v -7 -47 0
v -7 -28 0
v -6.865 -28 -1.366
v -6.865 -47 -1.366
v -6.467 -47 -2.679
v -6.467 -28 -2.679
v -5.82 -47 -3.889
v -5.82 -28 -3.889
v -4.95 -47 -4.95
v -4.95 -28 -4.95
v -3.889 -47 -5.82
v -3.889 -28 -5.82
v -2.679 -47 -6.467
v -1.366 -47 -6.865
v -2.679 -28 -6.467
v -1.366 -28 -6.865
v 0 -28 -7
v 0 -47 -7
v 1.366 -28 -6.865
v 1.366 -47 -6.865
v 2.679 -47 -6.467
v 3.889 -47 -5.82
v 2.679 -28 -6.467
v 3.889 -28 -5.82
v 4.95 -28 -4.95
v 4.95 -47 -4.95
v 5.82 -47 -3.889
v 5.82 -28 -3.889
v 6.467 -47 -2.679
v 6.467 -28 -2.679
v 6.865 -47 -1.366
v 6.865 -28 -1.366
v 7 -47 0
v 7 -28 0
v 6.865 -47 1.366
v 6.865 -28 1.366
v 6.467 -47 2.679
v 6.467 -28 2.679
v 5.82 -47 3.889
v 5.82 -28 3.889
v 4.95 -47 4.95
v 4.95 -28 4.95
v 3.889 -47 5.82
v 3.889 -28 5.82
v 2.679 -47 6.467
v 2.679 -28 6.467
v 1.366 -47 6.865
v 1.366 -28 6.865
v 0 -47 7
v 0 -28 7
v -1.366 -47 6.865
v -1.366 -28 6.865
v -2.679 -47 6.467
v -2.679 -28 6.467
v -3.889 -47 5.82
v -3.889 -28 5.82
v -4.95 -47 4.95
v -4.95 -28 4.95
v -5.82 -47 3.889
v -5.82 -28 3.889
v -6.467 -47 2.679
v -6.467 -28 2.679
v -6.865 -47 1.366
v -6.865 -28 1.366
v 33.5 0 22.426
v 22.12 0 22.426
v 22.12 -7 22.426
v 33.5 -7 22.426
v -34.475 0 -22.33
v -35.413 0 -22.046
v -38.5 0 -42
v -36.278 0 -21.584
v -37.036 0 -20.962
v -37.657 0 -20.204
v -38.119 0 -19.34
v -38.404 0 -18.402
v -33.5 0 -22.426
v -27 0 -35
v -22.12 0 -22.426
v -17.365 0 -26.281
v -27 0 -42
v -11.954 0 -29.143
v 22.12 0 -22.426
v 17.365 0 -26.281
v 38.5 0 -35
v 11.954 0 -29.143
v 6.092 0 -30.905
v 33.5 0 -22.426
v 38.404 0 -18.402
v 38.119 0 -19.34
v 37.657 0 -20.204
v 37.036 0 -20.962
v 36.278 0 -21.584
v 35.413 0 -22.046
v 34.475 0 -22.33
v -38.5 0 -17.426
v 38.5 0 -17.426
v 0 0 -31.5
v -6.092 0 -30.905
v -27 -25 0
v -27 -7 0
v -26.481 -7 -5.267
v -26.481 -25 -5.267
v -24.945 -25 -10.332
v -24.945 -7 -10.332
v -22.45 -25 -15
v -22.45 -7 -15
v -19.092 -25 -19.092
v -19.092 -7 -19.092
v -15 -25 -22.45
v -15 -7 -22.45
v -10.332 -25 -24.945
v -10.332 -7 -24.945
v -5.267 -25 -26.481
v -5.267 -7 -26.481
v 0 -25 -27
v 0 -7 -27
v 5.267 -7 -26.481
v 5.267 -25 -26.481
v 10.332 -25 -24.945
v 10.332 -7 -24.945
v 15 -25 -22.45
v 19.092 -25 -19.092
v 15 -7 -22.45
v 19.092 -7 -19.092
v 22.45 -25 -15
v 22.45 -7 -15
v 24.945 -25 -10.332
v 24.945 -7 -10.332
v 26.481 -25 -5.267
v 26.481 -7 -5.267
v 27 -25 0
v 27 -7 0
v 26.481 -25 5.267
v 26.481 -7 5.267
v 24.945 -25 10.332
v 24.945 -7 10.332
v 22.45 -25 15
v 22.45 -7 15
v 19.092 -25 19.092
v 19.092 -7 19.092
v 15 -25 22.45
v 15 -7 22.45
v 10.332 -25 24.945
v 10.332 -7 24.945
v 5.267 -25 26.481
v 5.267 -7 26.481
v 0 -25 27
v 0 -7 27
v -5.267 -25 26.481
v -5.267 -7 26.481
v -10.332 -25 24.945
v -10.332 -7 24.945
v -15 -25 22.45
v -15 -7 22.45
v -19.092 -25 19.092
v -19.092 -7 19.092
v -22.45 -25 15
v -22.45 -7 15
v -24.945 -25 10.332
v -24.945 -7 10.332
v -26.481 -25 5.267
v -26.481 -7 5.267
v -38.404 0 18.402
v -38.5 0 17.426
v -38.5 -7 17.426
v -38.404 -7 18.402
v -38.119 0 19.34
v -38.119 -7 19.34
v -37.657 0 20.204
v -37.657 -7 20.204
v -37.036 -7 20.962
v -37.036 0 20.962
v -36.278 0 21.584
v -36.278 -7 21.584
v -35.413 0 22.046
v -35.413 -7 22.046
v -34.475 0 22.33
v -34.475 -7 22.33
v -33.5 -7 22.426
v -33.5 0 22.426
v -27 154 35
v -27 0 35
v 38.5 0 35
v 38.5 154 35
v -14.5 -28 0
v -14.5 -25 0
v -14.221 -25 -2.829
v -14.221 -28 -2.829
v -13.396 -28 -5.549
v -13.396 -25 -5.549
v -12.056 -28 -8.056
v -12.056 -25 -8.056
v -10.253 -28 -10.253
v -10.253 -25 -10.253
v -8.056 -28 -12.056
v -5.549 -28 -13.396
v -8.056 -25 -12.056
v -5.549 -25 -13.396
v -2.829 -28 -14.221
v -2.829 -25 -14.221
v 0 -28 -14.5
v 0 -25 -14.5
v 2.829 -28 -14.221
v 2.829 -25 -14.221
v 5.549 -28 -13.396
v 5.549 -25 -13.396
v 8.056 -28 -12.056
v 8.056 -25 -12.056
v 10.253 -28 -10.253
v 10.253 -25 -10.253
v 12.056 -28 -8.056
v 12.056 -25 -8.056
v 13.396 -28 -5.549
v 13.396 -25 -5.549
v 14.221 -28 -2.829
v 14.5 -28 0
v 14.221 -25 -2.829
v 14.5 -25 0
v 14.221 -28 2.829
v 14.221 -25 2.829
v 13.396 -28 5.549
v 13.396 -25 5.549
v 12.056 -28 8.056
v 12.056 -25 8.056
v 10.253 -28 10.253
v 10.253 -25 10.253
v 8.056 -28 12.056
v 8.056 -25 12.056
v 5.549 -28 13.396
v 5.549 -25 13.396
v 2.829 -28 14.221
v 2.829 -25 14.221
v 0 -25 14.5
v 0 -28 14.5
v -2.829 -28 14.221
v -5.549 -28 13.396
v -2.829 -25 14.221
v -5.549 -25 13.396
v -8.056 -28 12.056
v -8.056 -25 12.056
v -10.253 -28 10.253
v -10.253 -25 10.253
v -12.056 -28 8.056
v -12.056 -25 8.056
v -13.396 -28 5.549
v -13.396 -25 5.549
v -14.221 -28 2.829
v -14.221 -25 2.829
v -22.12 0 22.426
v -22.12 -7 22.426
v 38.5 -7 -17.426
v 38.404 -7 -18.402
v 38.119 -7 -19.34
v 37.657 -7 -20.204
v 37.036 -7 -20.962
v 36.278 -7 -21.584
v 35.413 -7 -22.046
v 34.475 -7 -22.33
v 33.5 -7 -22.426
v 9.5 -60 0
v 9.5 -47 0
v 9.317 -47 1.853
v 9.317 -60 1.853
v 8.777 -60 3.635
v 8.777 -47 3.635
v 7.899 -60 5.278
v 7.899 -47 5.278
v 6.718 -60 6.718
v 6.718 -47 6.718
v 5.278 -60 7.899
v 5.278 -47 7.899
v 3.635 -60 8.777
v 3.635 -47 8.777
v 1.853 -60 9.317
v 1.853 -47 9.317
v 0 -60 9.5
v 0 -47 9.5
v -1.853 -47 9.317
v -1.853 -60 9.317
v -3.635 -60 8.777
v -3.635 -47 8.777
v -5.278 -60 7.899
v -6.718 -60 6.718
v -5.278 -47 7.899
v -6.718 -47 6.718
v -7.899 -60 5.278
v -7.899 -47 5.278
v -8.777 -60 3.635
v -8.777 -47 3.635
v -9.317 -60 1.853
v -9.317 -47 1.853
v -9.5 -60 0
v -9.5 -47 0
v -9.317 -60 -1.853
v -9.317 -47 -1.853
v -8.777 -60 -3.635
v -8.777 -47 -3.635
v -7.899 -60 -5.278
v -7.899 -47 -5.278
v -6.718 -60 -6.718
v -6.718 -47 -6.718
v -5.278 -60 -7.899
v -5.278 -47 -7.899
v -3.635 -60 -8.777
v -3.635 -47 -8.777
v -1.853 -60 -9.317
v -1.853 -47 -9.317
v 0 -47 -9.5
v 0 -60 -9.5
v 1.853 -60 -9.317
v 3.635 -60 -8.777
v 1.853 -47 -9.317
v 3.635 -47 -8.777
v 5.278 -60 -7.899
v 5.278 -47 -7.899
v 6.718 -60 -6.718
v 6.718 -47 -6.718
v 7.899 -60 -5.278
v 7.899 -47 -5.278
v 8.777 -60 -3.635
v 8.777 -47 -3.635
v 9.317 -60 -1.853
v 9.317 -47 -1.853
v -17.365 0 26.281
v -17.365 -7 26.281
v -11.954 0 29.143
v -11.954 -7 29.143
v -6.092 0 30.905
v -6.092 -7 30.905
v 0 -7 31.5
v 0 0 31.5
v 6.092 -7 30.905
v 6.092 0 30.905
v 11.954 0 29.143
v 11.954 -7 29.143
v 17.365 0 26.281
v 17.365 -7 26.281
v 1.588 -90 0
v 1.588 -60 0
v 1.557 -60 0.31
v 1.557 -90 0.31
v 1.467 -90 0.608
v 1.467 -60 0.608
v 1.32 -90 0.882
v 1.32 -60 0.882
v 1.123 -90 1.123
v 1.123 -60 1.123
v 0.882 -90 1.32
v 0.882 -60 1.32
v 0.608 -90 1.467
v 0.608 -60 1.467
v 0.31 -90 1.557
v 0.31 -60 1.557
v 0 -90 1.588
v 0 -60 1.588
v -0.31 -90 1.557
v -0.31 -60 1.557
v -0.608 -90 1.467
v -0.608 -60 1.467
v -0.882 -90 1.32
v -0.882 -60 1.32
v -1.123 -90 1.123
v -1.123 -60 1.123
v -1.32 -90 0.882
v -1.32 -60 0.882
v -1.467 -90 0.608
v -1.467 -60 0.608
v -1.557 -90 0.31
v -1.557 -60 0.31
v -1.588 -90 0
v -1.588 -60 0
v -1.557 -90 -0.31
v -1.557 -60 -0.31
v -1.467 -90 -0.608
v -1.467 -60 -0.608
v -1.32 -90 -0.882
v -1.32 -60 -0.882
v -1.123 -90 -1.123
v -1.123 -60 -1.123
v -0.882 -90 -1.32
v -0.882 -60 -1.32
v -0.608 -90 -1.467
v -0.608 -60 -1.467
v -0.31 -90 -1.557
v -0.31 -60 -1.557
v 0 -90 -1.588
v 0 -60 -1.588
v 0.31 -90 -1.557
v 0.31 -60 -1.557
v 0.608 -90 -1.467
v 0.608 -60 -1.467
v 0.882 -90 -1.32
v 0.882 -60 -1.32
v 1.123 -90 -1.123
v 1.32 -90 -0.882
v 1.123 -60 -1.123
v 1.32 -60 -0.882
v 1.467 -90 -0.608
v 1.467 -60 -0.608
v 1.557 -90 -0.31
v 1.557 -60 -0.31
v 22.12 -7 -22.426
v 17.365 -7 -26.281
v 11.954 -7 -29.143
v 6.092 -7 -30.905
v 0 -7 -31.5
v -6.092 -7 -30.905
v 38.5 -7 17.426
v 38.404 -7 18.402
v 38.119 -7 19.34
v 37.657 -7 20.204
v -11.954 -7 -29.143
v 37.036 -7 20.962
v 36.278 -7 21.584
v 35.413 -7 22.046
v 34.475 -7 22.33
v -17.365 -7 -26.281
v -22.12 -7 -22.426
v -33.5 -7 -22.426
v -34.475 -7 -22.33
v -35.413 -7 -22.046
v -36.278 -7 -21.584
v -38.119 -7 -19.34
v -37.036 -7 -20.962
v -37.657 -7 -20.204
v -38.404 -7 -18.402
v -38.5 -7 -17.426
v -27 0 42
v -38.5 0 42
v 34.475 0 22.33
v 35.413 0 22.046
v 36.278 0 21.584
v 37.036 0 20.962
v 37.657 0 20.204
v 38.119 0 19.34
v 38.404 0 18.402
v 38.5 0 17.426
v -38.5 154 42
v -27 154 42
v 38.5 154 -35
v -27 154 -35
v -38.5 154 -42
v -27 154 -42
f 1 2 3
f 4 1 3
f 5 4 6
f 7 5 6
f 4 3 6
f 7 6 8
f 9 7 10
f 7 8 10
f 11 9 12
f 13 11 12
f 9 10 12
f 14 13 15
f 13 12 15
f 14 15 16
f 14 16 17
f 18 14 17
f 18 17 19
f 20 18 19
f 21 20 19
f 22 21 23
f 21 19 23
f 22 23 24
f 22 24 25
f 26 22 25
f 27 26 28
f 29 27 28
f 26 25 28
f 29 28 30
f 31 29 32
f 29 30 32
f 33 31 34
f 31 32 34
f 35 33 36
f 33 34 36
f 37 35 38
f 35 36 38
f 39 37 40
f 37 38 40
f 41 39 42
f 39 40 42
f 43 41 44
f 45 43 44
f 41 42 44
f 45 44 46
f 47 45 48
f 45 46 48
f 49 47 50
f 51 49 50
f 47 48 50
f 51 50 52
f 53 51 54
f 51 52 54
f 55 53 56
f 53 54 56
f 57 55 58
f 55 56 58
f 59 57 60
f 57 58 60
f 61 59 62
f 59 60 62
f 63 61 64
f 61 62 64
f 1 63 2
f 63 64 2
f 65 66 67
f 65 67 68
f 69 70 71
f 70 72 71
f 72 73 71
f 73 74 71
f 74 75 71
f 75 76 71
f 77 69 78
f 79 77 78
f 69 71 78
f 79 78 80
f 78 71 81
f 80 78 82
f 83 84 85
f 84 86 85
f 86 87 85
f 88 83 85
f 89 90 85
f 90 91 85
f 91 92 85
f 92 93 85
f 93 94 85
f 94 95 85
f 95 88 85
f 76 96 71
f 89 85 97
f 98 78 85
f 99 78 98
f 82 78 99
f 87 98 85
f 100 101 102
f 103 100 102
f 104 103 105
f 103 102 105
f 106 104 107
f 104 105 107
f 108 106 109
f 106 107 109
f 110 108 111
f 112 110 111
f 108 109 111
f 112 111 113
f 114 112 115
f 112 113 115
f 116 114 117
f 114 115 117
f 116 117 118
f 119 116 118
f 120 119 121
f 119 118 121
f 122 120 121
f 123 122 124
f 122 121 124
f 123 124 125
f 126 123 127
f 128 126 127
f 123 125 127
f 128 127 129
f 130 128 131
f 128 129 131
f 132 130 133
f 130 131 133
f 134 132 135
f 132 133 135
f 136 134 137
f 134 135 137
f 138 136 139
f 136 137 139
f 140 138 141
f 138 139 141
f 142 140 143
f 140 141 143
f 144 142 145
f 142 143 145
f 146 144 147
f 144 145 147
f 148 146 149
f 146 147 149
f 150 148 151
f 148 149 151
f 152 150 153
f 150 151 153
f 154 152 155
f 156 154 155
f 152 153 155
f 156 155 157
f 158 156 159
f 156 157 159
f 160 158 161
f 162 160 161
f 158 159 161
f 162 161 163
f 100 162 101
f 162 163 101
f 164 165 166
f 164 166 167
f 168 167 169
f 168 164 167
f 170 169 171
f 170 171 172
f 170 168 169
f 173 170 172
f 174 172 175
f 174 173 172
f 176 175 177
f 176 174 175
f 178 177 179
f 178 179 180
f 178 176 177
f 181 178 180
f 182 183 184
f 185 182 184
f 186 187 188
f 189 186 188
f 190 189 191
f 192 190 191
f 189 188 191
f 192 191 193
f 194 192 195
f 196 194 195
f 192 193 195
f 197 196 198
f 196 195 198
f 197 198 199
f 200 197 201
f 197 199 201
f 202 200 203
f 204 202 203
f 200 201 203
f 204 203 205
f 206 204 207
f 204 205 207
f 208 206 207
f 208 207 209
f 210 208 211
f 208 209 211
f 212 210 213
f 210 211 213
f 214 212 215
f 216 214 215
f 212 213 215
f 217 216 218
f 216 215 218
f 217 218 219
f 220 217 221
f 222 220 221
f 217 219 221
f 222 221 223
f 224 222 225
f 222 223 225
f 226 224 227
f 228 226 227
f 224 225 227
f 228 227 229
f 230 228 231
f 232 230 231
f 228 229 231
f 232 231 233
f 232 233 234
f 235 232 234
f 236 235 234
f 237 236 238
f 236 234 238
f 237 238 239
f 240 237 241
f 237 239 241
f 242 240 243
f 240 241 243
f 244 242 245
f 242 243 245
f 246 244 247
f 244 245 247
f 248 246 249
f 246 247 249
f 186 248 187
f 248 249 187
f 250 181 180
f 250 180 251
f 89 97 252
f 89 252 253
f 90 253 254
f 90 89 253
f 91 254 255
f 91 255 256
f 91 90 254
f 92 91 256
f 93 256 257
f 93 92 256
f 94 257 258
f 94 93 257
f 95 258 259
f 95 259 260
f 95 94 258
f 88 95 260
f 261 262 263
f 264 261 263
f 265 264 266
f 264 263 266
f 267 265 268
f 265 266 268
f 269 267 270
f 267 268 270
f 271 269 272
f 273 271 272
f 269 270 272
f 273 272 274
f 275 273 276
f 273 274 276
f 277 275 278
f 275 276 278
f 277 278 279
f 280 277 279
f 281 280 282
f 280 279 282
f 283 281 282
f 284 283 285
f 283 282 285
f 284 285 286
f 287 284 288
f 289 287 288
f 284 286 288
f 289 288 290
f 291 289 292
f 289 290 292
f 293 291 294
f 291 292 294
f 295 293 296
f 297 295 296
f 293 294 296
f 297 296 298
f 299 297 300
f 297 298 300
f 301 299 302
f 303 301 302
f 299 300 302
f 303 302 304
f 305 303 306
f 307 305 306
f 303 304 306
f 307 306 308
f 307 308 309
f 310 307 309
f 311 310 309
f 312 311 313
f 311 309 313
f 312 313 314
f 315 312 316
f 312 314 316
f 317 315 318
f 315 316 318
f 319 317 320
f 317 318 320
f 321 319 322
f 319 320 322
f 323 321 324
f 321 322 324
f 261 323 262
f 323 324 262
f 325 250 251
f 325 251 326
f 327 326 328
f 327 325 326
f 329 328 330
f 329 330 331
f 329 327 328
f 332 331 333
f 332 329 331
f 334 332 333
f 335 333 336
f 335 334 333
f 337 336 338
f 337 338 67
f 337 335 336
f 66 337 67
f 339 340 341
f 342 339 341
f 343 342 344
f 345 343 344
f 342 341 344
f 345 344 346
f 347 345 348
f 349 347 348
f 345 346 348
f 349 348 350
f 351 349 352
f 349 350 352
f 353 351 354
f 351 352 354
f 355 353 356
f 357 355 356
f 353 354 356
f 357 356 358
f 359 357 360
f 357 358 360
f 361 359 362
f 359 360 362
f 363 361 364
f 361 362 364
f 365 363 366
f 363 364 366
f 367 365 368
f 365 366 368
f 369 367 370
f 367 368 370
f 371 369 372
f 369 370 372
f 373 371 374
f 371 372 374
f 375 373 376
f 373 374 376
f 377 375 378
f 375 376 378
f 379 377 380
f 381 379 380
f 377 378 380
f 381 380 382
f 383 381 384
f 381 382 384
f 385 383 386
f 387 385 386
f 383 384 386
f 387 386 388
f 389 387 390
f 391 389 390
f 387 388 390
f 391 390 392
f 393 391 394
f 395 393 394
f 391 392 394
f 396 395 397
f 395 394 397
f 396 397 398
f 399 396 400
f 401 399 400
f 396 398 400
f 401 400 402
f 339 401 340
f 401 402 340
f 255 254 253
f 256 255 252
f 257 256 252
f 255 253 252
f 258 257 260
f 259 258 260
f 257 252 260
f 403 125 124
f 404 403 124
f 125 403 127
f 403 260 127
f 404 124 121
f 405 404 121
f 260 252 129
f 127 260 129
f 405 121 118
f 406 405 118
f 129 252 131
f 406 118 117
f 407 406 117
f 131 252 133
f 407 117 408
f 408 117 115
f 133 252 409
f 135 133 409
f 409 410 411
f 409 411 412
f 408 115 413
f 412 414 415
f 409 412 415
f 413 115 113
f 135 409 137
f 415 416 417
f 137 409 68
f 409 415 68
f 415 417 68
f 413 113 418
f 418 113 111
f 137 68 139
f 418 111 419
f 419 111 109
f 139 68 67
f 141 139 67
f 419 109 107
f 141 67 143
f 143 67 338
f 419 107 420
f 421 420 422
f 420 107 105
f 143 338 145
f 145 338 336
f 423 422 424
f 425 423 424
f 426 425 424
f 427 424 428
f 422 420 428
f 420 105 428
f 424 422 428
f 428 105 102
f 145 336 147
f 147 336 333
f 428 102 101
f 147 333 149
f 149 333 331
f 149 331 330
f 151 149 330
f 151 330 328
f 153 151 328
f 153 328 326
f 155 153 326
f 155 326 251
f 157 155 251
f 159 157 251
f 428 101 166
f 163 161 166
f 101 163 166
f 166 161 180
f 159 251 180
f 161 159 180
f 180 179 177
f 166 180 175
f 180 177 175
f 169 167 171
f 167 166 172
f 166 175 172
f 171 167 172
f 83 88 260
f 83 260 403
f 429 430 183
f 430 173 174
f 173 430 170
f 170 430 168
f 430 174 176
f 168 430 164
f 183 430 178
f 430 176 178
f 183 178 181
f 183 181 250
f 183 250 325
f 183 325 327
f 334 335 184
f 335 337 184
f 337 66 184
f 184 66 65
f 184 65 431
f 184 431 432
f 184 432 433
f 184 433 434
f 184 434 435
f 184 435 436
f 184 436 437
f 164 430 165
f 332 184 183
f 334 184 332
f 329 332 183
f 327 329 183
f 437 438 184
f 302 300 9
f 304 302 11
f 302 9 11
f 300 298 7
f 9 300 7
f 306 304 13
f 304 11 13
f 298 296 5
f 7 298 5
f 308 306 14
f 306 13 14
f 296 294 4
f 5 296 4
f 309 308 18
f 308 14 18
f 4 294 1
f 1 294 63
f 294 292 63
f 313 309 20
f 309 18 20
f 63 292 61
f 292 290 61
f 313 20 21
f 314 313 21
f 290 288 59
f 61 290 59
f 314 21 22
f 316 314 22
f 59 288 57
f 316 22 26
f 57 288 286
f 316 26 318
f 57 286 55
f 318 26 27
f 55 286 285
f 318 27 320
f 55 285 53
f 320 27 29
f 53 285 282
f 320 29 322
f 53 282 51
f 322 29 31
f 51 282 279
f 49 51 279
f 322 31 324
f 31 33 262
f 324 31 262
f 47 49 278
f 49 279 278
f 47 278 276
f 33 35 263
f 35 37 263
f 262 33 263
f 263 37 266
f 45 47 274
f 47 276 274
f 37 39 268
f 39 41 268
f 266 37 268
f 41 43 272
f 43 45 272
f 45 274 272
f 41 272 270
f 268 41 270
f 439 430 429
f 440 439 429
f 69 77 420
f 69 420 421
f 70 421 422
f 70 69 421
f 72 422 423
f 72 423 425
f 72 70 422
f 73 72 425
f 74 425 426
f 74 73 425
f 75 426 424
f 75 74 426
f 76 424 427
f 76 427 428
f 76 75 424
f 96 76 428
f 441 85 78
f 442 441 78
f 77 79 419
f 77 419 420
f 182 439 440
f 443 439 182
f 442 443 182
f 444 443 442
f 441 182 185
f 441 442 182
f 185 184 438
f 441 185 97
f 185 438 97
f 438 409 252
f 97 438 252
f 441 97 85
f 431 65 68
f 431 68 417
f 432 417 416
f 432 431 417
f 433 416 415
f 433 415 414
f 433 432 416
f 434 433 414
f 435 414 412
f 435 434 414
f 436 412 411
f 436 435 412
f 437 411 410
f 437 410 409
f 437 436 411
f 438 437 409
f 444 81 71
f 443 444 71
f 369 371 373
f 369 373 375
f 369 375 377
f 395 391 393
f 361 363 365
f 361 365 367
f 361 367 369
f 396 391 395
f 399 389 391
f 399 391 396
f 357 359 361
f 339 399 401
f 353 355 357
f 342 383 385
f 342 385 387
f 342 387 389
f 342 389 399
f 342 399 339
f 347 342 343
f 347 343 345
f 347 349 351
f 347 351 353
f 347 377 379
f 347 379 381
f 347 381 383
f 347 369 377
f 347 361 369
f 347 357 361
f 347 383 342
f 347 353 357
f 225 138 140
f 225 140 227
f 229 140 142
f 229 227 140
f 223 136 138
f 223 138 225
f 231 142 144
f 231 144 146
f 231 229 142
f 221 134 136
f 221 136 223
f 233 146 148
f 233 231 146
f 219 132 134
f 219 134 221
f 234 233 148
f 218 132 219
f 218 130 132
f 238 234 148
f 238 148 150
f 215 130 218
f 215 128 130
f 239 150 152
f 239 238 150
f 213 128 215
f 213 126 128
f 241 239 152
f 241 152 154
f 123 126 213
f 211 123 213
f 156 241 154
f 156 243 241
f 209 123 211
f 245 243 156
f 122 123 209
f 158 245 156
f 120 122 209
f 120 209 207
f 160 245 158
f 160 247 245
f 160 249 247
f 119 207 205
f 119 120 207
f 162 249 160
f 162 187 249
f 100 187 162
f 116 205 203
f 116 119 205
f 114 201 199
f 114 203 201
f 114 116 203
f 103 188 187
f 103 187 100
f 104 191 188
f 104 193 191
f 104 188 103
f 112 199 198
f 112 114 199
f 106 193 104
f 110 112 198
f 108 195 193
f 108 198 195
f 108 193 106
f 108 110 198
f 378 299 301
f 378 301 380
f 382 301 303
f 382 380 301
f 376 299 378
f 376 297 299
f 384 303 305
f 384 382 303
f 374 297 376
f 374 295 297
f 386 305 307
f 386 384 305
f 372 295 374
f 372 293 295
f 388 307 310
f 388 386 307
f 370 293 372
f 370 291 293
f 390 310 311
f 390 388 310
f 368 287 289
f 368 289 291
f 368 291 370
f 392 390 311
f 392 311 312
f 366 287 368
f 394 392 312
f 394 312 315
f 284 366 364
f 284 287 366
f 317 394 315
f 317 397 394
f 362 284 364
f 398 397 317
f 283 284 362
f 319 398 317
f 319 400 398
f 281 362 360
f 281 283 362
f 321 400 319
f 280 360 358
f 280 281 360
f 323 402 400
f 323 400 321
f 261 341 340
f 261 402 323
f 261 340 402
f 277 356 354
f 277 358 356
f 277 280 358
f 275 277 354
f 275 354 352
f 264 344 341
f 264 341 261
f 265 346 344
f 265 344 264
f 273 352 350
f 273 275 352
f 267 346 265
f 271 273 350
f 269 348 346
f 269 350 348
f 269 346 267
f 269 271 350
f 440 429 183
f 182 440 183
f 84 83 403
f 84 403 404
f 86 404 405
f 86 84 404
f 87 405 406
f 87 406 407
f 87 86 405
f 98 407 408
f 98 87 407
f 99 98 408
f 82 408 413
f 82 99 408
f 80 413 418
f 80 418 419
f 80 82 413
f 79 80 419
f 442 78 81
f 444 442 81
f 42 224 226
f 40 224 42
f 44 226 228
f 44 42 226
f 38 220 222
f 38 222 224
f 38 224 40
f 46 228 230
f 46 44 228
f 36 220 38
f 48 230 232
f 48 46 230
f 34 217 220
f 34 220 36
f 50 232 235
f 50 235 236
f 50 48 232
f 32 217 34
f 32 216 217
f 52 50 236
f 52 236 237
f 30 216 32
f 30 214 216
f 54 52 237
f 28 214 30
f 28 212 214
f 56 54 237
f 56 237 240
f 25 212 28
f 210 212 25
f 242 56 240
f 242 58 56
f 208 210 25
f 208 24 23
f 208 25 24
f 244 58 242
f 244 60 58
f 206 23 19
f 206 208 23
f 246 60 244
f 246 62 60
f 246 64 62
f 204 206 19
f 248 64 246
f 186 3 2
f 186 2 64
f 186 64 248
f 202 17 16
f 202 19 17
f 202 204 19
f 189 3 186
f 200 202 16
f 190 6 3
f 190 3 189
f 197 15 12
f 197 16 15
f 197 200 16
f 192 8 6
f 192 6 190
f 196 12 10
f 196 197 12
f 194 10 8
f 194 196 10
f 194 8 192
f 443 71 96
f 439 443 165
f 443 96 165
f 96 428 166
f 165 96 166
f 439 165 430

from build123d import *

# Parameters (mm, degrees)
BODY_EXTRUD_DEPTH   = 154
BOSS_EXTRUDE2_DEPTH = 7
SKETCH3_R           = 27
BOSS_EXTRUDE3_DEPTH = 18
SKETCH4_R           = 14.5
BOSS_EXTRUDE4_DEPTH = 3
SKETCH5_R           = 7
BOSS_EXTRUDE5_DEPTH = 19
SKETCH6_R           = 9.5
BOSS_EXTRUDE6_DEPTH = 13
SKETCH7_R           = 1.5875
BOSS_EXTRUDE7_DEPTH = 30


with BuildPart() as part:
    # Body → Body_extrud (new body)
    with BuildSketch(Plane(origin=(0, 0, 0), x_dir=(1, 0, 0), z_dir=(0, 1, 0))):
        Polygon((-38.5, -35), (-38.5, -42), (-27, -42), (-27, -35), (38.5, -35), (38.5, 35), (-27, 35), (-27, 42), (-38.5, 42), (-38.5, 35), align=None)
    extrude(amount=BODY_EXTRUD_DEPTH)

    # Sketch2 → Boss-Extrude2 (add)
    with BuildSketch(Plane.XZ):
        with BuildLine():
            Line((-33.5, 22.426470588), (-22.120203818, 22.426470588))
            ThreePointArc((-22.120203818, 22.426470588), (0, 31.5), (22.120203818, 22.426470588))
            Line((22.120203818, 22.426470588), (33.5, 22.426470588))
            ThreePointArc((33.5, 22.426470588), (37.035533906, 20.962004494), (38.5, 17.426470588))
            Line((38.5, 17.426470588), (38.5, -17.426470588))
            ThreePointArc((38.5, -17.426470588), (37.035533906, -20.962004494), (33.5, -22.426470588))
            Line((33.5, -22.426470588), (22.120203818, -22.426470588))
            ThreePointArc((22.120203818, -22.426470588), (0, -31.5), (-22.120203818, -22.426470588))
            Line((-22.120203818, -22.426470588), (-33.5, -22.426470588))
            ThreePointArc((-33.5, -22.426470588), (-37.035533906, -20.962004494), (-38.5, -17.426470588))
            Line((-38.5, -17.426470588), (-38.5, 17.426470588))
            ThreePointArc((-38.5, 17.426470588), (-37.035533906, 20.962004494), (-33.5, 22.426470588))
        make_face()
    extrude(amount=BOSS_EXTRUDE2_DEPTH)

    # Sketch3 → Boss-Extrude3 (add)
    with BuildSketch(Plane(origin=(0, -7, 0), x_dir=(-1, 0, 0), z_dir=(0, -1, 0))):
        Circle(SKETCH3_R)
    extrude(amount=BOSS_EXTRUDE3_DEPTH)

    # Sketch4 → Boss-Extrude4 (add)
    with BuildSketch(Plane(origin=(0, -25, 0), x_dir=(-1, 0, 0), z_dir=(0, -1, 0))):
        Circle(SKETCH4_R)
    extrude(amount=BOSS_EXTRUDE4_DEPTH)

    # Sketch5 → Boss-Extrude5 (add)
    with BuildSketch(Plane(origin=(0, -28, 0), x_dir=(-1, 0, 0), z_dir=(0, -1, 0))):
        Circle(SKETCH5_R)
    extrude(amount=BOSS_EXTRUDE5_DEPTH)

    # Sketch6 → Boss-Extrude6 (add)
    with BuildSketch(Plane.XZ.offset(47)):
        Circle(SKETCH6_R)
    extrude(amount=BOSS_EXTRUDE6_DEPTH)

    # Sketch7 → Boss-Extrude7 (add)
    with BuildSketch(Plane.XZ.offset(60)):
        Circle(SKETCH7_R)
    extrude(amount=BOSS_EXTRUDE7_DEPTH)


solid = part.part
